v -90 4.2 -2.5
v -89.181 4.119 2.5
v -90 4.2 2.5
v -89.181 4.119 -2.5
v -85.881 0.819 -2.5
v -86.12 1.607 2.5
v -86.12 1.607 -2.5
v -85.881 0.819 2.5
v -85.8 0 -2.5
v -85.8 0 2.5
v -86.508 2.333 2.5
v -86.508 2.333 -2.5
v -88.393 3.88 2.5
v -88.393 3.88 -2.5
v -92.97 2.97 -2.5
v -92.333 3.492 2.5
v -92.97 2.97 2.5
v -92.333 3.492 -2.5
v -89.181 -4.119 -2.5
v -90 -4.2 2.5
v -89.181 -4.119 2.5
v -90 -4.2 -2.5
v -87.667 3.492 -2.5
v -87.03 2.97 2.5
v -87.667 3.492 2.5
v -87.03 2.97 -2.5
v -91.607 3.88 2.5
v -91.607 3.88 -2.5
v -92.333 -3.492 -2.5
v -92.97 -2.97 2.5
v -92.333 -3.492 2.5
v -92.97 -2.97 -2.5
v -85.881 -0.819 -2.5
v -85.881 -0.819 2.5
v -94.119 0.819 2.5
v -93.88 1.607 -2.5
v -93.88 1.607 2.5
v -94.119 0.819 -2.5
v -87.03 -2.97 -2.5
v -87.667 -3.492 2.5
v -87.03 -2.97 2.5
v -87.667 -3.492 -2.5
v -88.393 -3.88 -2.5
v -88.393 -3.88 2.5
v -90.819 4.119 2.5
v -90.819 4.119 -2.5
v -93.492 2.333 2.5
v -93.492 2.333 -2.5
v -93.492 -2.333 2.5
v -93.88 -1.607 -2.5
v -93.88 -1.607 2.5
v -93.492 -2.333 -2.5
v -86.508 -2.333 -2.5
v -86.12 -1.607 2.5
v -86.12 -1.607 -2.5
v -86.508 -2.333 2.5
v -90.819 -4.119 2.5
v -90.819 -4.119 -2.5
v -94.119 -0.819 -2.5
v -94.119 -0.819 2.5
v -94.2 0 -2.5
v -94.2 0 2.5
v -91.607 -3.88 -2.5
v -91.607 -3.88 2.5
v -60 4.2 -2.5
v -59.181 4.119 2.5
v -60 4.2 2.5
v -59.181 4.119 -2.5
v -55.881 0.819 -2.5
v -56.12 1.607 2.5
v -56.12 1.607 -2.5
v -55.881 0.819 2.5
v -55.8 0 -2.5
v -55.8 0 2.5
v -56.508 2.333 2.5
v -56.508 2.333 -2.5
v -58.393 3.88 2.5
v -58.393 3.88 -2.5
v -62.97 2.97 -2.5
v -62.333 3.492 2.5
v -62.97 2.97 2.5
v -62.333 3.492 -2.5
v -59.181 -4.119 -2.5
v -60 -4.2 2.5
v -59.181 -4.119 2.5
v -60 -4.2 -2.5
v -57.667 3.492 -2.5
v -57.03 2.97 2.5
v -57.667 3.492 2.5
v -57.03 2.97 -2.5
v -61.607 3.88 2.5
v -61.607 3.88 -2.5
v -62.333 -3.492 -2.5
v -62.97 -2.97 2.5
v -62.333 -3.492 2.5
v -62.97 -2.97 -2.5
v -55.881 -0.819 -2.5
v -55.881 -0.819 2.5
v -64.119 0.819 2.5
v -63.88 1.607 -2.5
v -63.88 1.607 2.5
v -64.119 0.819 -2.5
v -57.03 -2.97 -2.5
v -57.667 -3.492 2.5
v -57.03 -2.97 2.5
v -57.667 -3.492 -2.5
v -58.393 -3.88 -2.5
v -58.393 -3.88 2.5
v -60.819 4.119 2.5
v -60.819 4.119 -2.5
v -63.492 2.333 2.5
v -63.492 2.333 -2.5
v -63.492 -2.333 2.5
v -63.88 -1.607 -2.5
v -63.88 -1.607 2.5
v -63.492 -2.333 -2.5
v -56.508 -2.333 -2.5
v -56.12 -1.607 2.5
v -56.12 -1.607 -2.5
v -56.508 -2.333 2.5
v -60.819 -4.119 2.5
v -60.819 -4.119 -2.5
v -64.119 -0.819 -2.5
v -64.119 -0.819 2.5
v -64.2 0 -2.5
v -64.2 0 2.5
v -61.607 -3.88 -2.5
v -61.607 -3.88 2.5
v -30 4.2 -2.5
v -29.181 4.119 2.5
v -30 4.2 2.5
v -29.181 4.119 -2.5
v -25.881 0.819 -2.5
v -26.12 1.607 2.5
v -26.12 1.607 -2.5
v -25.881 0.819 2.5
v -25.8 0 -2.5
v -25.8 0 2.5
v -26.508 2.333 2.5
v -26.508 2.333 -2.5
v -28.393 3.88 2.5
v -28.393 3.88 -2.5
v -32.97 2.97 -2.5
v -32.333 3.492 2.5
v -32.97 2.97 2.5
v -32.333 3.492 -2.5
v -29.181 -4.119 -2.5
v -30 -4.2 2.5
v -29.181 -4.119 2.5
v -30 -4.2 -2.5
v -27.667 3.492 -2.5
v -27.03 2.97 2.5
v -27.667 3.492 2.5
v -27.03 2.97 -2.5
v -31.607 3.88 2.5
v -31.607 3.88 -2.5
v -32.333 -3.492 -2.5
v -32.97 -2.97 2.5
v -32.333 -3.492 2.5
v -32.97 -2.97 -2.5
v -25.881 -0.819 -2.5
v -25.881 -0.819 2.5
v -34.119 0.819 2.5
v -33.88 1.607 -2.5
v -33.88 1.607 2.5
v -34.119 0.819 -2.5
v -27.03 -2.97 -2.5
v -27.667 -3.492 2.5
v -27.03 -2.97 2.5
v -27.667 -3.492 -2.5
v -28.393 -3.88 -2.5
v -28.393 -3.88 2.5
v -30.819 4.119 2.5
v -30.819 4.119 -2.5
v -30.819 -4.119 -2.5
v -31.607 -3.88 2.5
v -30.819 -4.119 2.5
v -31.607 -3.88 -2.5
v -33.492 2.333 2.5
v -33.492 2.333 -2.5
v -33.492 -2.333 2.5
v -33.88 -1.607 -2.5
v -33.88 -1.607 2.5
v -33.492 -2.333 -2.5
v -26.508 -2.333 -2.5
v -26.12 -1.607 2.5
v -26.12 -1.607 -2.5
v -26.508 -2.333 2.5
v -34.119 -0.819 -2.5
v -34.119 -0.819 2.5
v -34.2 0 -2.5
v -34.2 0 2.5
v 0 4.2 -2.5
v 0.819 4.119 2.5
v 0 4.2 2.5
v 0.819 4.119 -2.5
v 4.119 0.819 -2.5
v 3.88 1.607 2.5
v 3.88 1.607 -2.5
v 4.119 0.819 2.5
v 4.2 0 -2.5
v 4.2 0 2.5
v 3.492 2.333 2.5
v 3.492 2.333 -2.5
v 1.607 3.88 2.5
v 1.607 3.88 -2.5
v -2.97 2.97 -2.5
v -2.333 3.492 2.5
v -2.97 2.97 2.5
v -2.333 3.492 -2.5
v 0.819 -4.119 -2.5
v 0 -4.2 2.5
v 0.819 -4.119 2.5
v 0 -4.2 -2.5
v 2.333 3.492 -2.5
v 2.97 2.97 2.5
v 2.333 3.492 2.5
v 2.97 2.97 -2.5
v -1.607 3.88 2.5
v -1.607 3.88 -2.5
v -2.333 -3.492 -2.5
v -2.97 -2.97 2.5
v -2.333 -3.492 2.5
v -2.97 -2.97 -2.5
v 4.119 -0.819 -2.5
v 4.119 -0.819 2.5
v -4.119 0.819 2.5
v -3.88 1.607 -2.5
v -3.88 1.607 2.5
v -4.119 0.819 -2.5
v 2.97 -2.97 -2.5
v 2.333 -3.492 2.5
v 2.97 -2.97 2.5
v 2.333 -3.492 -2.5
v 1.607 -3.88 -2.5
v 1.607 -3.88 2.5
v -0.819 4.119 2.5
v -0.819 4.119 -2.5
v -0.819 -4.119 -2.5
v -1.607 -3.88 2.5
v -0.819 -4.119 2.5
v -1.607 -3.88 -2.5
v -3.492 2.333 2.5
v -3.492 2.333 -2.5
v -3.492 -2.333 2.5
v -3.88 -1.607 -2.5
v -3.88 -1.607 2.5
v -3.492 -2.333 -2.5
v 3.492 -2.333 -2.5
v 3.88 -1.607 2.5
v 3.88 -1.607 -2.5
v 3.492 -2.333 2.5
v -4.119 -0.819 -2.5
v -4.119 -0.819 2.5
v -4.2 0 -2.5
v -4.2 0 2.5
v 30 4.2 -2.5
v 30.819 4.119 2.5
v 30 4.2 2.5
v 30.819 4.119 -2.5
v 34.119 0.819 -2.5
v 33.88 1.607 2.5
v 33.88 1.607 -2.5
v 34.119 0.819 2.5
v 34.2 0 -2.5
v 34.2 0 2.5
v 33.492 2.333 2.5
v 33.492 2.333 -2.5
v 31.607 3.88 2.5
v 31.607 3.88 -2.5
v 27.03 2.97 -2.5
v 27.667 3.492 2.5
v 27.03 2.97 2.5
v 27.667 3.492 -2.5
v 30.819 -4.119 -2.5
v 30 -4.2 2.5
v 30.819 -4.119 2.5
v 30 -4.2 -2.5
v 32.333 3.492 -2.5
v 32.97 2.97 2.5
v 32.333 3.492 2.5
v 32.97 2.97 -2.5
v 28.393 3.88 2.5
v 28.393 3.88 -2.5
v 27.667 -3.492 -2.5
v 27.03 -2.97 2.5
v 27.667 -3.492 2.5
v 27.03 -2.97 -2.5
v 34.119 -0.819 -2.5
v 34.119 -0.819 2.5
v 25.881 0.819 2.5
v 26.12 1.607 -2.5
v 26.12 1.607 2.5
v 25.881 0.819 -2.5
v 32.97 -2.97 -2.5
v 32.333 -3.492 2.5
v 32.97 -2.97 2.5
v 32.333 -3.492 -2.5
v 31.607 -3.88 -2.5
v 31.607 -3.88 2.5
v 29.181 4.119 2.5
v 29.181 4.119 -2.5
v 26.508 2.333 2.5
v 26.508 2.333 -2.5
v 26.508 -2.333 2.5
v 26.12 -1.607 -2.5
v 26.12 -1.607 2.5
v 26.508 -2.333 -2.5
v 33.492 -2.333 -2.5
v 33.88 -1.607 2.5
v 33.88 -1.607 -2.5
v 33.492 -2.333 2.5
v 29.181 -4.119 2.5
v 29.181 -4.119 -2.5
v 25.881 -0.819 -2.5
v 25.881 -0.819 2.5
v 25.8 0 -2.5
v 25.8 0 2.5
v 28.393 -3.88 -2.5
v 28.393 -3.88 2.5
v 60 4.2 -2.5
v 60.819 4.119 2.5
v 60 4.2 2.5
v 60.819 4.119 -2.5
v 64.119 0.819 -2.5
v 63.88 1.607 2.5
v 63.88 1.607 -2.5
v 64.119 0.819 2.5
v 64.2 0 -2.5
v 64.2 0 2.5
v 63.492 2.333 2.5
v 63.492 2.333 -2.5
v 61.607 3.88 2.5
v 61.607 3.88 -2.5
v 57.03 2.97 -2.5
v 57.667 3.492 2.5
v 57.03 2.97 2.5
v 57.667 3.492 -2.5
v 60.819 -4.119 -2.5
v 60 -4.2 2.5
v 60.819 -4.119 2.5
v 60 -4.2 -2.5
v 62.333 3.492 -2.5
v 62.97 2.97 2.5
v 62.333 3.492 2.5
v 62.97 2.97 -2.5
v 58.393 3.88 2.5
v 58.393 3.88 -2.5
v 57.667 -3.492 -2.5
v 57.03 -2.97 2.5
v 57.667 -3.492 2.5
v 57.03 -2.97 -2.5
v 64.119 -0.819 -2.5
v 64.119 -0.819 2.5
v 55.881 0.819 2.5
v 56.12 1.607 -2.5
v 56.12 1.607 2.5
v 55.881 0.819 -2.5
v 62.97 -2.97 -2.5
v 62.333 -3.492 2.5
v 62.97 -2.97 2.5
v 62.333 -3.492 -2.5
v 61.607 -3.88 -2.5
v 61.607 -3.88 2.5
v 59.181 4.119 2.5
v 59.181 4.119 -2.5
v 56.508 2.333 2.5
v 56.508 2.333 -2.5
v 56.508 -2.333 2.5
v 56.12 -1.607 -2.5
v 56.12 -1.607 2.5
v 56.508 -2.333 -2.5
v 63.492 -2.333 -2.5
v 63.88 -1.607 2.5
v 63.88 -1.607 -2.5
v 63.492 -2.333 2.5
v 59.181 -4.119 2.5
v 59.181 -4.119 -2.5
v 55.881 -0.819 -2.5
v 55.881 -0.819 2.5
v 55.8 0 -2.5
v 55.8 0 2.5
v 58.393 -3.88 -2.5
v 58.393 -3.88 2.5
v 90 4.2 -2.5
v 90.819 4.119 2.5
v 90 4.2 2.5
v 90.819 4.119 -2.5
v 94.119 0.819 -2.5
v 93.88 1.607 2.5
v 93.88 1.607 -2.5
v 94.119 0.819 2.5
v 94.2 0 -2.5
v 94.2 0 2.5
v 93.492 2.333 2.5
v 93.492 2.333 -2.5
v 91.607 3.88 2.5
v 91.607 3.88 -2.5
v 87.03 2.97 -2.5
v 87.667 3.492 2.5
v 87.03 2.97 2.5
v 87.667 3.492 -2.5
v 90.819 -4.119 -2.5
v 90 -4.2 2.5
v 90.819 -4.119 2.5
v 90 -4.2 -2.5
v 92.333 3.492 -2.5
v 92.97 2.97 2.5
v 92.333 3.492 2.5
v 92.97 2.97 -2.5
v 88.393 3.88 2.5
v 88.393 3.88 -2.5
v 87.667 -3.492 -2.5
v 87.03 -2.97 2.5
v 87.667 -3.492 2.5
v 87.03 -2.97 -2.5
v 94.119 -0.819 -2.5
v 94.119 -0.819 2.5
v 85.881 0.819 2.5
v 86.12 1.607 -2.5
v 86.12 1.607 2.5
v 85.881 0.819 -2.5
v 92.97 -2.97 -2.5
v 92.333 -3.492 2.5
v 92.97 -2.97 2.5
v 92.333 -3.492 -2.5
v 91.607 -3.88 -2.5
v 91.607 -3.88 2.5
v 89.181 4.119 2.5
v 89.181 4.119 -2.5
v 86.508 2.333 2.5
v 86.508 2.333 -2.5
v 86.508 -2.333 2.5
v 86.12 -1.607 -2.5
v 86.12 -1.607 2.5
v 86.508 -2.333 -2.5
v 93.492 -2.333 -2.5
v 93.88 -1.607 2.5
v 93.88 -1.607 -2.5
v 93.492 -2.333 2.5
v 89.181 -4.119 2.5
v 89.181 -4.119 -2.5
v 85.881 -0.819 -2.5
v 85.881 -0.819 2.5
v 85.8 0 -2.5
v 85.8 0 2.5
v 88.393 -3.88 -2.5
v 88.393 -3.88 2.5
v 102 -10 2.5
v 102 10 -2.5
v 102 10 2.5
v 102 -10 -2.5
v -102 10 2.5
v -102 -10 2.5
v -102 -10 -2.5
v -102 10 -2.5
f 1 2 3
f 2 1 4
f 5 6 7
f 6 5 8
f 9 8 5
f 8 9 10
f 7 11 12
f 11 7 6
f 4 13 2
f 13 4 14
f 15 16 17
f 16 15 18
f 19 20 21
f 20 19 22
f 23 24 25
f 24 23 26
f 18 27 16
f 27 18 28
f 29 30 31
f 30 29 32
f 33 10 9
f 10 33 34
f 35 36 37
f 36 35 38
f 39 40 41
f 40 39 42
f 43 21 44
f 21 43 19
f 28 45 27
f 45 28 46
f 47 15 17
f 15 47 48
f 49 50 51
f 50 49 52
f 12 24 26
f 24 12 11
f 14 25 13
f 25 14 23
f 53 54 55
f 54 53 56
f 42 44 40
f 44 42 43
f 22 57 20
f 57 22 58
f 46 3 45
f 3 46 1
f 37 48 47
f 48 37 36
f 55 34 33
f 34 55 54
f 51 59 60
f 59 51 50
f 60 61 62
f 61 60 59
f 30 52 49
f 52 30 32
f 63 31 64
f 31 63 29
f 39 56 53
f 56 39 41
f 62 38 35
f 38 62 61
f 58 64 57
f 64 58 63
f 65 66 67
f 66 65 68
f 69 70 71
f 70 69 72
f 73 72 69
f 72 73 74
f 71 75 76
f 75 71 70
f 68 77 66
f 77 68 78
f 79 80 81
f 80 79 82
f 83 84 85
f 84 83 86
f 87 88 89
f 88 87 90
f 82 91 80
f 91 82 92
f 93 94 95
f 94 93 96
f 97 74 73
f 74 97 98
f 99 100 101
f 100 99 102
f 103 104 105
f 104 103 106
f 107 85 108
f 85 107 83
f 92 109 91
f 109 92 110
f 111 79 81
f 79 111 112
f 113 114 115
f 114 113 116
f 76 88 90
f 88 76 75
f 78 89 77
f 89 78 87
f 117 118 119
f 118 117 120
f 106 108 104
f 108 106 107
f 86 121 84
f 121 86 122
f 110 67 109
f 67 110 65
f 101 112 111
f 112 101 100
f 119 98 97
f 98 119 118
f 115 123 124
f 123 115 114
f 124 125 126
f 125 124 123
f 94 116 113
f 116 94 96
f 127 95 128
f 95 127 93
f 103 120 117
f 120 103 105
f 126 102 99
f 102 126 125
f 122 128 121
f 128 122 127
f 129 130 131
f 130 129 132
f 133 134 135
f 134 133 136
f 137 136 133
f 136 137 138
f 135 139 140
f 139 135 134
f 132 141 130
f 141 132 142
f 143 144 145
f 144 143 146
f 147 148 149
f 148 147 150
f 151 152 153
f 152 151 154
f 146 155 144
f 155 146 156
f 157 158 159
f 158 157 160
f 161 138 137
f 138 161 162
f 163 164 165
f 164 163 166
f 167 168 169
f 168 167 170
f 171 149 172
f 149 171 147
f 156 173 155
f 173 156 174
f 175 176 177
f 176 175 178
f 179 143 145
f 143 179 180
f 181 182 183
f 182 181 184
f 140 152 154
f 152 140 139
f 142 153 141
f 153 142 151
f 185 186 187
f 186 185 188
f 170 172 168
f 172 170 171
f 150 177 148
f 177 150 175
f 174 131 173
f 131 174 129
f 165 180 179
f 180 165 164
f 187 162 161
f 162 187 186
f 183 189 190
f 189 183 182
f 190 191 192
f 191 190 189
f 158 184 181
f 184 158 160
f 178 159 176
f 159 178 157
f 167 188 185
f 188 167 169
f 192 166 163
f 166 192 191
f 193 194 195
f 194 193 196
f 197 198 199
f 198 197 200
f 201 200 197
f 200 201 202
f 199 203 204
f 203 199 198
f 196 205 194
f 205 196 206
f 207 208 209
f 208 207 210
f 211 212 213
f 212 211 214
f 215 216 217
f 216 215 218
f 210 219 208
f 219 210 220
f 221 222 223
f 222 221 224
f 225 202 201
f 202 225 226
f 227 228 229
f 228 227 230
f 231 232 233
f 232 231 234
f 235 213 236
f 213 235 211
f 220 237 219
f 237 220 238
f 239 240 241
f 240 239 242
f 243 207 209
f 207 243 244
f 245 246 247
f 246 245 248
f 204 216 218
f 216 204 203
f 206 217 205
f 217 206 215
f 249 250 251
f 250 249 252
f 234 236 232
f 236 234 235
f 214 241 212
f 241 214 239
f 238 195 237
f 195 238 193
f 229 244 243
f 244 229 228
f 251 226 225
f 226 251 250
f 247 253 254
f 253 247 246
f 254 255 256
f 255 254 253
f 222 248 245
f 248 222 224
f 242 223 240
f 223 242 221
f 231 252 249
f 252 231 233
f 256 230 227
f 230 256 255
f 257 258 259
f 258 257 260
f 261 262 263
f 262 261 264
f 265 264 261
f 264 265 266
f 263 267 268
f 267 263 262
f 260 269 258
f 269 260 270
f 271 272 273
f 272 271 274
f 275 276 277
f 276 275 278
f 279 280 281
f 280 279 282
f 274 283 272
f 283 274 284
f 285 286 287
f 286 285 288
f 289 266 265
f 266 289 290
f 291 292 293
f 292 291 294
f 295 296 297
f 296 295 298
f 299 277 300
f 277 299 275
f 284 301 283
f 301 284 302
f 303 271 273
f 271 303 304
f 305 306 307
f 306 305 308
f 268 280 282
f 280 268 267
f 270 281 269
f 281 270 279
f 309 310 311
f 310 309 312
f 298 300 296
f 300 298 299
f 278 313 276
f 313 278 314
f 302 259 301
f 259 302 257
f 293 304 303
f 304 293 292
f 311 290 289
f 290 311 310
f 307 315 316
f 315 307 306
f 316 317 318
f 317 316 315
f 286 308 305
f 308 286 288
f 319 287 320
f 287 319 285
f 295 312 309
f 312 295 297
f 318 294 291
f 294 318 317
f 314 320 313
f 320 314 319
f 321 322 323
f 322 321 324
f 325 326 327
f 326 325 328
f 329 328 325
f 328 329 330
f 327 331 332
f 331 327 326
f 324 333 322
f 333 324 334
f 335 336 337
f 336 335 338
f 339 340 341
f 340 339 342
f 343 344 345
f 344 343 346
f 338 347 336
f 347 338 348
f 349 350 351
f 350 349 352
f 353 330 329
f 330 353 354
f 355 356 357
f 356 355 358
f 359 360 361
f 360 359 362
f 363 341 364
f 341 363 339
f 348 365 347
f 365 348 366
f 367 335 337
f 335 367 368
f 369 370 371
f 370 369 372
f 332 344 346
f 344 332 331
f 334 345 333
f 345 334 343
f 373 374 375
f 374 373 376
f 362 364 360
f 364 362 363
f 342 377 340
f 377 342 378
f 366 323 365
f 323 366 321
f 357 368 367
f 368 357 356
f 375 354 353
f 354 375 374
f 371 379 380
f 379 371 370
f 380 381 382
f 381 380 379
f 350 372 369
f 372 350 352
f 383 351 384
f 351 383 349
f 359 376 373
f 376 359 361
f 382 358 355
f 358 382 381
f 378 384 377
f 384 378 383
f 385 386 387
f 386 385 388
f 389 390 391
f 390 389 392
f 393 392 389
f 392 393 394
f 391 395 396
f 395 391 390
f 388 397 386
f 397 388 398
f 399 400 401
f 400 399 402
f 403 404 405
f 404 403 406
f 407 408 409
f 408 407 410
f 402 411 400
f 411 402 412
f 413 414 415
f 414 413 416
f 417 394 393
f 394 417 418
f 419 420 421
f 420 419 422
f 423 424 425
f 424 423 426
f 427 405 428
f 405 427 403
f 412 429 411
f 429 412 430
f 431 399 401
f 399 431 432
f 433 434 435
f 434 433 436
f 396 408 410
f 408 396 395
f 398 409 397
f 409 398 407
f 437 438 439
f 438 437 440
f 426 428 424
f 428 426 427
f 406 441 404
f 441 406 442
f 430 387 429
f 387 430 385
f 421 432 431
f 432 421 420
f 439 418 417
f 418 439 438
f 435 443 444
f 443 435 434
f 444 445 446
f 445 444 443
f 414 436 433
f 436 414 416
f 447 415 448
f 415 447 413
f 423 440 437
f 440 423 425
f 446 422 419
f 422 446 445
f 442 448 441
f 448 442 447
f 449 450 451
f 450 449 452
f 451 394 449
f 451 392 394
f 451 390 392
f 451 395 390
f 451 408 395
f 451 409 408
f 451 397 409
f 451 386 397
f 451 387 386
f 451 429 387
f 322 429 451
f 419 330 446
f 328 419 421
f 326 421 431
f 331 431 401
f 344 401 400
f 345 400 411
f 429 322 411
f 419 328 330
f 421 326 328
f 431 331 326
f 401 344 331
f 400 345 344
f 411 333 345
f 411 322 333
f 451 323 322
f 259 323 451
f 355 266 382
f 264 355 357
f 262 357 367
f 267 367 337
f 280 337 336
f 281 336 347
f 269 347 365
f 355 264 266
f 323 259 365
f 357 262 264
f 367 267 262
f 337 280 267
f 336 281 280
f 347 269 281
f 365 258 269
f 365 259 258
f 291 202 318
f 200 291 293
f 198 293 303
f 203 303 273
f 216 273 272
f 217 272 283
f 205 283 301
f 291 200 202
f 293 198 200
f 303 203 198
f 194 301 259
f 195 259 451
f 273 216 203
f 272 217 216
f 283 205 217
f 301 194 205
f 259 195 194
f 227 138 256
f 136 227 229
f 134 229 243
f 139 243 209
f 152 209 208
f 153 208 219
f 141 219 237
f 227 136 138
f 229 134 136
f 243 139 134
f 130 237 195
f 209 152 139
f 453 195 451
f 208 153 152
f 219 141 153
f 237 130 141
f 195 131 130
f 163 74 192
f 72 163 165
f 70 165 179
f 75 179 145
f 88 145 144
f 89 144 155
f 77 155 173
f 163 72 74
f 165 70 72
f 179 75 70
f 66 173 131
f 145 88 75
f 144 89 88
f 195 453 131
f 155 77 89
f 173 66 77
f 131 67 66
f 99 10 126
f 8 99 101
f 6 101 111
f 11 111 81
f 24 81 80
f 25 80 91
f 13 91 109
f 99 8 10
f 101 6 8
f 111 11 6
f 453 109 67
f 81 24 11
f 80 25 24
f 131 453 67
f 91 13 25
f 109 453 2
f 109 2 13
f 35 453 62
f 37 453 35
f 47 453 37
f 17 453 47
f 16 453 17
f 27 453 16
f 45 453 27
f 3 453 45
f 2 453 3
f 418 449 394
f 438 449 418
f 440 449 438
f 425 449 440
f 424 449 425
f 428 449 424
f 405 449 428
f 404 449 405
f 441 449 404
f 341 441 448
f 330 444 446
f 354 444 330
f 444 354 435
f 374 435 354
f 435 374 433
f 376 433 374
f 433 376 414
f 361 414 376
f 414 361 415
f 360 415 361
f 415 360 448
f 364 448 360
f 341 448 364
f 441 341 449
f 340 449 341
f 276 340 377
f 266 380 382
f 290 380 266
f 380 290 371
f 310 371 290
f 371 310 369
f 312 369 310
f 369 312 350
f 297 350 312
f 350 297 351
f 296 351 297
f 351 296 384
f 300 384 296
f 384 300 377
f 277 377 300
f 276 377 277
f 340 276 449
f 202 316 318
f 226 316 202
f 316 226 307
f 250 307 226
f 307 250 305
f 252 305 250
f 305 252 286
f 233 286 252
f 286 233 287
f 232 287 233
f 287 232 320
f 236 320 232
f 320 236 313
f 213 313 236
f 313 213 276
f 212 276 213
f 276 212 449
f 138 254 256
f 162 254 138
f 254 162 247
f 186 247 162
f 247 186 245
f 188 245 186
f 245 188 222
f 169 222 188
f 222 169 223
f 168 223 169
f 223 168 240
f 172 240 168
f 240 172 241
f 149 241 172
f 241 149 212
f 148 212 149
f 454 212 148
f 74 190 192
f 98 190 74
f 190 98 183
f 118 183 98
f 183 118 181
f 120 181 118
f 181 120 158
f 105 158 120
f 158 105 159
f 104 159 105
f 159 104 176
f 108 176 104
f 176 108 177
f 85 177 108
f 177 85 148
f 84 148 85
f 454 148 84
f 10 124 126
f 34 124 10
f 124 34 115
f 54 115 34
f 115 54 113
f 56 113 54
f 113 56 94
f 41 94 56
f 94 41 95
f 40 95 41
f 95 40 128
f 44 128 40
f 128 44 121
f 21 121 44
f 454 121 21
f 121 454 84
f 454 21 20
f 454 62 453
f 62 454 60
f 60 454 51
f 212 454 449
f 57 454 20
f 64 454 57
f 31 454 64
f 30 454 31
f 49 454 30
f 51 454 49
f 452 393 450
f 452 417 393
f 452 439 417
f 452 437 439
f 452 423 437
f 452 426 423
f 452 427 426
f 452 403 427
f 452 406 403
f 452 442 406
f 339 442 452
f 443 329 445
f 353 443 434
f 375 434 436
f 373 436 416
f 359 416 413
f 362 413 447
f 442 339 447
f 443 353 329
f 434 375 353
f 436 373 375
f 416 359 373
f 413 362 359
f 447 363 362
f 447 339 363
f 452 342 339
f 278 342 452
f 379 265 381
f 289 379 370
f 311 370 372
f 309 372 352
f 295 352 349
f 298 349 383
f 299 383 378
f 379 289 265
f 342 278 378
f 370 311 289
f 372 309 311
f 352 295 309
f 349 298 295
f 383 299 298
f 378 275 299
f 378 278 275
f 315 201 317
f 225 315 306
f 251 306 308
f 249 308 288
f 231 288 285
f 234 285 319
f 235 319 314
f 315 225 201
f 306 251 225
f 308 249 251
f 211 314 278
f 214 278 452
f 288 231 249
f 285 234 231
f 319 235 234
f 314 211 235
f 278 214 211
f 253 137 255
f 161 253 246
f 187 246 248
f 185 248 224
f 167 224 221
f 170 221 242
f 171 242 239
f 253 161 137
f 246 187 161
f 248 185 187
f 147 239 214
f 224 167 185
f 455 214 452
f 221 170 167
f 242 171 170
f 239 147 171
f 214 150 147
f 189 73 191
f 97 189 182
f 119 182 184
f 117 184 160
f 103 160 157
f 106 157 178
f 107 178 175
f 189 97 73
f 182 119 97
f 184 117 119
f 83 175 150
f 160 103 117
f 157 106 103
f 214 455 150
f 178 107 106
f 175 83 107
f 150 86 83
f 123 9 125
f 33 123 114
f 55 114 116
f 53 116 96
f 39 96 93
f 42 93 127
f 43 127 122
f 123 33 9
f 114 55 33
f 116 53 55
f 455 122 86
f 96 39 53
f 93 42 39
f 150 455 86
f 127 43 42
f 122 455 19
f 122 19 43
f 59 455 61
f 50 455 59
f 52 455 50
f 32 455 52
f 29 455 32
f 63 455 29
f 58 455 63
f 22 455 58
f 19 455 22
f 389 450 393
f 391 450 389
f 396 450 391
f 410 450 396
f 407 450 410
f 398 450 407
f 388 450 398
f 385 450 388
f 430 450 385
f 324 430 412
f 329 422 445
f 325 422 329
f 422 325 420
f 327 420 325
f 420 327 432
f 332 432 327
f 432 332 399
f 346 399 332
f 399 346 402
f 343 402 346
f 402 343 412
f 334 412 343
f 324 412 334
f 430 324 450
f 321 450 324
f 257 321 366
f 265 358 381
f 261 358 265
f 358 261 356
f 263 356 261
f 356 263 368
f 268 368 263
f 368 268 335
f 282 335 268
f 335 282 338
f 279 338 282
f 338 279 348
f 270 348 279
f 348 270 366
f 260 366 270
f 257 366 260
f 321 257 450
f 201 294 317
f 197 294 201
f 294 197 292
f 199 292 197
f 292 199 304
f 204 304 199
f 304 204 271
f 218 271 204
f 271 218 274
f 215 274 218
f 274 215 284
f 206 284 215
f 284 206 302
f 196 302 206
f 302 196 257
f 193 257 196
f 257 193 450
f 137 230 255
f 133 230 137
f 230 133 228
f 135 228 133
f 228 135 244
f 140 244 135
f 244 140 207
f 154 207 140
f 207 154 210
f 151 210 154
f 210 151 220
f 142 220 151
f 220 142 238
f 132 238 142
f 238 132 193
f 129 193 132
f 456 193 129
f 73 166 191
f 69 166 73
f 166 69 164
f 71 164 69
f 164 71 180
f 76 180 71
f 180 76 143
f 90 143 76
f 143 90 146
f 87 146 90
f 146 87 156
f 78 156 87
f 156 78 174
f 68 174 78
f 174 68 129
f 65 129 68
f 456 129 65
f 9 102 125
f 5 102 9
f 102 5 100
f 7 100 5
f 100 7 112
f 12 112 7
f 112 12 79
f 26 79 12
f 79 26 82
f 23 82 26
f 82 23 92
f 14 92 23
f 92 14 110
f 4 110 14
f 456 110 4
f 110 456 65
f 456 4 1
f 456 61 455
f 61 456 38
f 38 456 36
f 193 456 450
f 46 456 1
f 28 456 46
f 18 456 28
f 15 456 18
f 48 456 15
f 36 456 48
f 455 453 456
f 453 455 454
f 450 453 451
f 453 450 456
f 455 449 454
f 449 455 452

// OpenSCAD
$fn = 32;

// ----------------------------------------------------------------------
// Hole bar, 7 x Ø8.4
// skip layout, 12 mm edge offset
// ----------------------------------------------------------------------

// --- parameters (mm) ---
bar_w = 20;       // bar width (Y)
bar_t = 5;        // bar thickness (Z)
holes = 7;        // holes per row
hole_d = 8.4;     // hole diameter
edge = 12;        // offset from the bar end to the first hole
grid_pitch = 15;  // grid the bar was laid out on

// --- derived feature positions (mm) ---
pitch = grid_pitch * 2;       // = 30   holes sit every other grid slot
span = (holes - 1) * pitch;   // = 180   distance between the end holes
bar_l = span + 2 * edge;      // = 204   overall bar length
start_x = -bar_l / 2 + edge;  // = -90   X of the first hole
feature_centers = [
  [start_x + 0 * pitch, 0],
  [start_x + 1 * pitch, 0],
  [start_x + 2 * pitch, 0],
  [start_x + 3 * pitch, 0],
  [start_x + 4 * pitch, 0],
  [start_x + 5 * pitch, 0],
  [start_x + 6 * pitch, 0]
];   // hole centres of the first row

// bar with one row of holes, drilled from feature_centers
difference() {
  translate([-bar_l / 2, -bar_w / 2, -bar_t / 2]) cube([bar_l, bar_w, bar_t]);
  for (centre = feature_centers)
    translate([centre[0], centre[1], 0])
      cylinder(d = hole_d, h = bar_t + 2, center = true);
}
